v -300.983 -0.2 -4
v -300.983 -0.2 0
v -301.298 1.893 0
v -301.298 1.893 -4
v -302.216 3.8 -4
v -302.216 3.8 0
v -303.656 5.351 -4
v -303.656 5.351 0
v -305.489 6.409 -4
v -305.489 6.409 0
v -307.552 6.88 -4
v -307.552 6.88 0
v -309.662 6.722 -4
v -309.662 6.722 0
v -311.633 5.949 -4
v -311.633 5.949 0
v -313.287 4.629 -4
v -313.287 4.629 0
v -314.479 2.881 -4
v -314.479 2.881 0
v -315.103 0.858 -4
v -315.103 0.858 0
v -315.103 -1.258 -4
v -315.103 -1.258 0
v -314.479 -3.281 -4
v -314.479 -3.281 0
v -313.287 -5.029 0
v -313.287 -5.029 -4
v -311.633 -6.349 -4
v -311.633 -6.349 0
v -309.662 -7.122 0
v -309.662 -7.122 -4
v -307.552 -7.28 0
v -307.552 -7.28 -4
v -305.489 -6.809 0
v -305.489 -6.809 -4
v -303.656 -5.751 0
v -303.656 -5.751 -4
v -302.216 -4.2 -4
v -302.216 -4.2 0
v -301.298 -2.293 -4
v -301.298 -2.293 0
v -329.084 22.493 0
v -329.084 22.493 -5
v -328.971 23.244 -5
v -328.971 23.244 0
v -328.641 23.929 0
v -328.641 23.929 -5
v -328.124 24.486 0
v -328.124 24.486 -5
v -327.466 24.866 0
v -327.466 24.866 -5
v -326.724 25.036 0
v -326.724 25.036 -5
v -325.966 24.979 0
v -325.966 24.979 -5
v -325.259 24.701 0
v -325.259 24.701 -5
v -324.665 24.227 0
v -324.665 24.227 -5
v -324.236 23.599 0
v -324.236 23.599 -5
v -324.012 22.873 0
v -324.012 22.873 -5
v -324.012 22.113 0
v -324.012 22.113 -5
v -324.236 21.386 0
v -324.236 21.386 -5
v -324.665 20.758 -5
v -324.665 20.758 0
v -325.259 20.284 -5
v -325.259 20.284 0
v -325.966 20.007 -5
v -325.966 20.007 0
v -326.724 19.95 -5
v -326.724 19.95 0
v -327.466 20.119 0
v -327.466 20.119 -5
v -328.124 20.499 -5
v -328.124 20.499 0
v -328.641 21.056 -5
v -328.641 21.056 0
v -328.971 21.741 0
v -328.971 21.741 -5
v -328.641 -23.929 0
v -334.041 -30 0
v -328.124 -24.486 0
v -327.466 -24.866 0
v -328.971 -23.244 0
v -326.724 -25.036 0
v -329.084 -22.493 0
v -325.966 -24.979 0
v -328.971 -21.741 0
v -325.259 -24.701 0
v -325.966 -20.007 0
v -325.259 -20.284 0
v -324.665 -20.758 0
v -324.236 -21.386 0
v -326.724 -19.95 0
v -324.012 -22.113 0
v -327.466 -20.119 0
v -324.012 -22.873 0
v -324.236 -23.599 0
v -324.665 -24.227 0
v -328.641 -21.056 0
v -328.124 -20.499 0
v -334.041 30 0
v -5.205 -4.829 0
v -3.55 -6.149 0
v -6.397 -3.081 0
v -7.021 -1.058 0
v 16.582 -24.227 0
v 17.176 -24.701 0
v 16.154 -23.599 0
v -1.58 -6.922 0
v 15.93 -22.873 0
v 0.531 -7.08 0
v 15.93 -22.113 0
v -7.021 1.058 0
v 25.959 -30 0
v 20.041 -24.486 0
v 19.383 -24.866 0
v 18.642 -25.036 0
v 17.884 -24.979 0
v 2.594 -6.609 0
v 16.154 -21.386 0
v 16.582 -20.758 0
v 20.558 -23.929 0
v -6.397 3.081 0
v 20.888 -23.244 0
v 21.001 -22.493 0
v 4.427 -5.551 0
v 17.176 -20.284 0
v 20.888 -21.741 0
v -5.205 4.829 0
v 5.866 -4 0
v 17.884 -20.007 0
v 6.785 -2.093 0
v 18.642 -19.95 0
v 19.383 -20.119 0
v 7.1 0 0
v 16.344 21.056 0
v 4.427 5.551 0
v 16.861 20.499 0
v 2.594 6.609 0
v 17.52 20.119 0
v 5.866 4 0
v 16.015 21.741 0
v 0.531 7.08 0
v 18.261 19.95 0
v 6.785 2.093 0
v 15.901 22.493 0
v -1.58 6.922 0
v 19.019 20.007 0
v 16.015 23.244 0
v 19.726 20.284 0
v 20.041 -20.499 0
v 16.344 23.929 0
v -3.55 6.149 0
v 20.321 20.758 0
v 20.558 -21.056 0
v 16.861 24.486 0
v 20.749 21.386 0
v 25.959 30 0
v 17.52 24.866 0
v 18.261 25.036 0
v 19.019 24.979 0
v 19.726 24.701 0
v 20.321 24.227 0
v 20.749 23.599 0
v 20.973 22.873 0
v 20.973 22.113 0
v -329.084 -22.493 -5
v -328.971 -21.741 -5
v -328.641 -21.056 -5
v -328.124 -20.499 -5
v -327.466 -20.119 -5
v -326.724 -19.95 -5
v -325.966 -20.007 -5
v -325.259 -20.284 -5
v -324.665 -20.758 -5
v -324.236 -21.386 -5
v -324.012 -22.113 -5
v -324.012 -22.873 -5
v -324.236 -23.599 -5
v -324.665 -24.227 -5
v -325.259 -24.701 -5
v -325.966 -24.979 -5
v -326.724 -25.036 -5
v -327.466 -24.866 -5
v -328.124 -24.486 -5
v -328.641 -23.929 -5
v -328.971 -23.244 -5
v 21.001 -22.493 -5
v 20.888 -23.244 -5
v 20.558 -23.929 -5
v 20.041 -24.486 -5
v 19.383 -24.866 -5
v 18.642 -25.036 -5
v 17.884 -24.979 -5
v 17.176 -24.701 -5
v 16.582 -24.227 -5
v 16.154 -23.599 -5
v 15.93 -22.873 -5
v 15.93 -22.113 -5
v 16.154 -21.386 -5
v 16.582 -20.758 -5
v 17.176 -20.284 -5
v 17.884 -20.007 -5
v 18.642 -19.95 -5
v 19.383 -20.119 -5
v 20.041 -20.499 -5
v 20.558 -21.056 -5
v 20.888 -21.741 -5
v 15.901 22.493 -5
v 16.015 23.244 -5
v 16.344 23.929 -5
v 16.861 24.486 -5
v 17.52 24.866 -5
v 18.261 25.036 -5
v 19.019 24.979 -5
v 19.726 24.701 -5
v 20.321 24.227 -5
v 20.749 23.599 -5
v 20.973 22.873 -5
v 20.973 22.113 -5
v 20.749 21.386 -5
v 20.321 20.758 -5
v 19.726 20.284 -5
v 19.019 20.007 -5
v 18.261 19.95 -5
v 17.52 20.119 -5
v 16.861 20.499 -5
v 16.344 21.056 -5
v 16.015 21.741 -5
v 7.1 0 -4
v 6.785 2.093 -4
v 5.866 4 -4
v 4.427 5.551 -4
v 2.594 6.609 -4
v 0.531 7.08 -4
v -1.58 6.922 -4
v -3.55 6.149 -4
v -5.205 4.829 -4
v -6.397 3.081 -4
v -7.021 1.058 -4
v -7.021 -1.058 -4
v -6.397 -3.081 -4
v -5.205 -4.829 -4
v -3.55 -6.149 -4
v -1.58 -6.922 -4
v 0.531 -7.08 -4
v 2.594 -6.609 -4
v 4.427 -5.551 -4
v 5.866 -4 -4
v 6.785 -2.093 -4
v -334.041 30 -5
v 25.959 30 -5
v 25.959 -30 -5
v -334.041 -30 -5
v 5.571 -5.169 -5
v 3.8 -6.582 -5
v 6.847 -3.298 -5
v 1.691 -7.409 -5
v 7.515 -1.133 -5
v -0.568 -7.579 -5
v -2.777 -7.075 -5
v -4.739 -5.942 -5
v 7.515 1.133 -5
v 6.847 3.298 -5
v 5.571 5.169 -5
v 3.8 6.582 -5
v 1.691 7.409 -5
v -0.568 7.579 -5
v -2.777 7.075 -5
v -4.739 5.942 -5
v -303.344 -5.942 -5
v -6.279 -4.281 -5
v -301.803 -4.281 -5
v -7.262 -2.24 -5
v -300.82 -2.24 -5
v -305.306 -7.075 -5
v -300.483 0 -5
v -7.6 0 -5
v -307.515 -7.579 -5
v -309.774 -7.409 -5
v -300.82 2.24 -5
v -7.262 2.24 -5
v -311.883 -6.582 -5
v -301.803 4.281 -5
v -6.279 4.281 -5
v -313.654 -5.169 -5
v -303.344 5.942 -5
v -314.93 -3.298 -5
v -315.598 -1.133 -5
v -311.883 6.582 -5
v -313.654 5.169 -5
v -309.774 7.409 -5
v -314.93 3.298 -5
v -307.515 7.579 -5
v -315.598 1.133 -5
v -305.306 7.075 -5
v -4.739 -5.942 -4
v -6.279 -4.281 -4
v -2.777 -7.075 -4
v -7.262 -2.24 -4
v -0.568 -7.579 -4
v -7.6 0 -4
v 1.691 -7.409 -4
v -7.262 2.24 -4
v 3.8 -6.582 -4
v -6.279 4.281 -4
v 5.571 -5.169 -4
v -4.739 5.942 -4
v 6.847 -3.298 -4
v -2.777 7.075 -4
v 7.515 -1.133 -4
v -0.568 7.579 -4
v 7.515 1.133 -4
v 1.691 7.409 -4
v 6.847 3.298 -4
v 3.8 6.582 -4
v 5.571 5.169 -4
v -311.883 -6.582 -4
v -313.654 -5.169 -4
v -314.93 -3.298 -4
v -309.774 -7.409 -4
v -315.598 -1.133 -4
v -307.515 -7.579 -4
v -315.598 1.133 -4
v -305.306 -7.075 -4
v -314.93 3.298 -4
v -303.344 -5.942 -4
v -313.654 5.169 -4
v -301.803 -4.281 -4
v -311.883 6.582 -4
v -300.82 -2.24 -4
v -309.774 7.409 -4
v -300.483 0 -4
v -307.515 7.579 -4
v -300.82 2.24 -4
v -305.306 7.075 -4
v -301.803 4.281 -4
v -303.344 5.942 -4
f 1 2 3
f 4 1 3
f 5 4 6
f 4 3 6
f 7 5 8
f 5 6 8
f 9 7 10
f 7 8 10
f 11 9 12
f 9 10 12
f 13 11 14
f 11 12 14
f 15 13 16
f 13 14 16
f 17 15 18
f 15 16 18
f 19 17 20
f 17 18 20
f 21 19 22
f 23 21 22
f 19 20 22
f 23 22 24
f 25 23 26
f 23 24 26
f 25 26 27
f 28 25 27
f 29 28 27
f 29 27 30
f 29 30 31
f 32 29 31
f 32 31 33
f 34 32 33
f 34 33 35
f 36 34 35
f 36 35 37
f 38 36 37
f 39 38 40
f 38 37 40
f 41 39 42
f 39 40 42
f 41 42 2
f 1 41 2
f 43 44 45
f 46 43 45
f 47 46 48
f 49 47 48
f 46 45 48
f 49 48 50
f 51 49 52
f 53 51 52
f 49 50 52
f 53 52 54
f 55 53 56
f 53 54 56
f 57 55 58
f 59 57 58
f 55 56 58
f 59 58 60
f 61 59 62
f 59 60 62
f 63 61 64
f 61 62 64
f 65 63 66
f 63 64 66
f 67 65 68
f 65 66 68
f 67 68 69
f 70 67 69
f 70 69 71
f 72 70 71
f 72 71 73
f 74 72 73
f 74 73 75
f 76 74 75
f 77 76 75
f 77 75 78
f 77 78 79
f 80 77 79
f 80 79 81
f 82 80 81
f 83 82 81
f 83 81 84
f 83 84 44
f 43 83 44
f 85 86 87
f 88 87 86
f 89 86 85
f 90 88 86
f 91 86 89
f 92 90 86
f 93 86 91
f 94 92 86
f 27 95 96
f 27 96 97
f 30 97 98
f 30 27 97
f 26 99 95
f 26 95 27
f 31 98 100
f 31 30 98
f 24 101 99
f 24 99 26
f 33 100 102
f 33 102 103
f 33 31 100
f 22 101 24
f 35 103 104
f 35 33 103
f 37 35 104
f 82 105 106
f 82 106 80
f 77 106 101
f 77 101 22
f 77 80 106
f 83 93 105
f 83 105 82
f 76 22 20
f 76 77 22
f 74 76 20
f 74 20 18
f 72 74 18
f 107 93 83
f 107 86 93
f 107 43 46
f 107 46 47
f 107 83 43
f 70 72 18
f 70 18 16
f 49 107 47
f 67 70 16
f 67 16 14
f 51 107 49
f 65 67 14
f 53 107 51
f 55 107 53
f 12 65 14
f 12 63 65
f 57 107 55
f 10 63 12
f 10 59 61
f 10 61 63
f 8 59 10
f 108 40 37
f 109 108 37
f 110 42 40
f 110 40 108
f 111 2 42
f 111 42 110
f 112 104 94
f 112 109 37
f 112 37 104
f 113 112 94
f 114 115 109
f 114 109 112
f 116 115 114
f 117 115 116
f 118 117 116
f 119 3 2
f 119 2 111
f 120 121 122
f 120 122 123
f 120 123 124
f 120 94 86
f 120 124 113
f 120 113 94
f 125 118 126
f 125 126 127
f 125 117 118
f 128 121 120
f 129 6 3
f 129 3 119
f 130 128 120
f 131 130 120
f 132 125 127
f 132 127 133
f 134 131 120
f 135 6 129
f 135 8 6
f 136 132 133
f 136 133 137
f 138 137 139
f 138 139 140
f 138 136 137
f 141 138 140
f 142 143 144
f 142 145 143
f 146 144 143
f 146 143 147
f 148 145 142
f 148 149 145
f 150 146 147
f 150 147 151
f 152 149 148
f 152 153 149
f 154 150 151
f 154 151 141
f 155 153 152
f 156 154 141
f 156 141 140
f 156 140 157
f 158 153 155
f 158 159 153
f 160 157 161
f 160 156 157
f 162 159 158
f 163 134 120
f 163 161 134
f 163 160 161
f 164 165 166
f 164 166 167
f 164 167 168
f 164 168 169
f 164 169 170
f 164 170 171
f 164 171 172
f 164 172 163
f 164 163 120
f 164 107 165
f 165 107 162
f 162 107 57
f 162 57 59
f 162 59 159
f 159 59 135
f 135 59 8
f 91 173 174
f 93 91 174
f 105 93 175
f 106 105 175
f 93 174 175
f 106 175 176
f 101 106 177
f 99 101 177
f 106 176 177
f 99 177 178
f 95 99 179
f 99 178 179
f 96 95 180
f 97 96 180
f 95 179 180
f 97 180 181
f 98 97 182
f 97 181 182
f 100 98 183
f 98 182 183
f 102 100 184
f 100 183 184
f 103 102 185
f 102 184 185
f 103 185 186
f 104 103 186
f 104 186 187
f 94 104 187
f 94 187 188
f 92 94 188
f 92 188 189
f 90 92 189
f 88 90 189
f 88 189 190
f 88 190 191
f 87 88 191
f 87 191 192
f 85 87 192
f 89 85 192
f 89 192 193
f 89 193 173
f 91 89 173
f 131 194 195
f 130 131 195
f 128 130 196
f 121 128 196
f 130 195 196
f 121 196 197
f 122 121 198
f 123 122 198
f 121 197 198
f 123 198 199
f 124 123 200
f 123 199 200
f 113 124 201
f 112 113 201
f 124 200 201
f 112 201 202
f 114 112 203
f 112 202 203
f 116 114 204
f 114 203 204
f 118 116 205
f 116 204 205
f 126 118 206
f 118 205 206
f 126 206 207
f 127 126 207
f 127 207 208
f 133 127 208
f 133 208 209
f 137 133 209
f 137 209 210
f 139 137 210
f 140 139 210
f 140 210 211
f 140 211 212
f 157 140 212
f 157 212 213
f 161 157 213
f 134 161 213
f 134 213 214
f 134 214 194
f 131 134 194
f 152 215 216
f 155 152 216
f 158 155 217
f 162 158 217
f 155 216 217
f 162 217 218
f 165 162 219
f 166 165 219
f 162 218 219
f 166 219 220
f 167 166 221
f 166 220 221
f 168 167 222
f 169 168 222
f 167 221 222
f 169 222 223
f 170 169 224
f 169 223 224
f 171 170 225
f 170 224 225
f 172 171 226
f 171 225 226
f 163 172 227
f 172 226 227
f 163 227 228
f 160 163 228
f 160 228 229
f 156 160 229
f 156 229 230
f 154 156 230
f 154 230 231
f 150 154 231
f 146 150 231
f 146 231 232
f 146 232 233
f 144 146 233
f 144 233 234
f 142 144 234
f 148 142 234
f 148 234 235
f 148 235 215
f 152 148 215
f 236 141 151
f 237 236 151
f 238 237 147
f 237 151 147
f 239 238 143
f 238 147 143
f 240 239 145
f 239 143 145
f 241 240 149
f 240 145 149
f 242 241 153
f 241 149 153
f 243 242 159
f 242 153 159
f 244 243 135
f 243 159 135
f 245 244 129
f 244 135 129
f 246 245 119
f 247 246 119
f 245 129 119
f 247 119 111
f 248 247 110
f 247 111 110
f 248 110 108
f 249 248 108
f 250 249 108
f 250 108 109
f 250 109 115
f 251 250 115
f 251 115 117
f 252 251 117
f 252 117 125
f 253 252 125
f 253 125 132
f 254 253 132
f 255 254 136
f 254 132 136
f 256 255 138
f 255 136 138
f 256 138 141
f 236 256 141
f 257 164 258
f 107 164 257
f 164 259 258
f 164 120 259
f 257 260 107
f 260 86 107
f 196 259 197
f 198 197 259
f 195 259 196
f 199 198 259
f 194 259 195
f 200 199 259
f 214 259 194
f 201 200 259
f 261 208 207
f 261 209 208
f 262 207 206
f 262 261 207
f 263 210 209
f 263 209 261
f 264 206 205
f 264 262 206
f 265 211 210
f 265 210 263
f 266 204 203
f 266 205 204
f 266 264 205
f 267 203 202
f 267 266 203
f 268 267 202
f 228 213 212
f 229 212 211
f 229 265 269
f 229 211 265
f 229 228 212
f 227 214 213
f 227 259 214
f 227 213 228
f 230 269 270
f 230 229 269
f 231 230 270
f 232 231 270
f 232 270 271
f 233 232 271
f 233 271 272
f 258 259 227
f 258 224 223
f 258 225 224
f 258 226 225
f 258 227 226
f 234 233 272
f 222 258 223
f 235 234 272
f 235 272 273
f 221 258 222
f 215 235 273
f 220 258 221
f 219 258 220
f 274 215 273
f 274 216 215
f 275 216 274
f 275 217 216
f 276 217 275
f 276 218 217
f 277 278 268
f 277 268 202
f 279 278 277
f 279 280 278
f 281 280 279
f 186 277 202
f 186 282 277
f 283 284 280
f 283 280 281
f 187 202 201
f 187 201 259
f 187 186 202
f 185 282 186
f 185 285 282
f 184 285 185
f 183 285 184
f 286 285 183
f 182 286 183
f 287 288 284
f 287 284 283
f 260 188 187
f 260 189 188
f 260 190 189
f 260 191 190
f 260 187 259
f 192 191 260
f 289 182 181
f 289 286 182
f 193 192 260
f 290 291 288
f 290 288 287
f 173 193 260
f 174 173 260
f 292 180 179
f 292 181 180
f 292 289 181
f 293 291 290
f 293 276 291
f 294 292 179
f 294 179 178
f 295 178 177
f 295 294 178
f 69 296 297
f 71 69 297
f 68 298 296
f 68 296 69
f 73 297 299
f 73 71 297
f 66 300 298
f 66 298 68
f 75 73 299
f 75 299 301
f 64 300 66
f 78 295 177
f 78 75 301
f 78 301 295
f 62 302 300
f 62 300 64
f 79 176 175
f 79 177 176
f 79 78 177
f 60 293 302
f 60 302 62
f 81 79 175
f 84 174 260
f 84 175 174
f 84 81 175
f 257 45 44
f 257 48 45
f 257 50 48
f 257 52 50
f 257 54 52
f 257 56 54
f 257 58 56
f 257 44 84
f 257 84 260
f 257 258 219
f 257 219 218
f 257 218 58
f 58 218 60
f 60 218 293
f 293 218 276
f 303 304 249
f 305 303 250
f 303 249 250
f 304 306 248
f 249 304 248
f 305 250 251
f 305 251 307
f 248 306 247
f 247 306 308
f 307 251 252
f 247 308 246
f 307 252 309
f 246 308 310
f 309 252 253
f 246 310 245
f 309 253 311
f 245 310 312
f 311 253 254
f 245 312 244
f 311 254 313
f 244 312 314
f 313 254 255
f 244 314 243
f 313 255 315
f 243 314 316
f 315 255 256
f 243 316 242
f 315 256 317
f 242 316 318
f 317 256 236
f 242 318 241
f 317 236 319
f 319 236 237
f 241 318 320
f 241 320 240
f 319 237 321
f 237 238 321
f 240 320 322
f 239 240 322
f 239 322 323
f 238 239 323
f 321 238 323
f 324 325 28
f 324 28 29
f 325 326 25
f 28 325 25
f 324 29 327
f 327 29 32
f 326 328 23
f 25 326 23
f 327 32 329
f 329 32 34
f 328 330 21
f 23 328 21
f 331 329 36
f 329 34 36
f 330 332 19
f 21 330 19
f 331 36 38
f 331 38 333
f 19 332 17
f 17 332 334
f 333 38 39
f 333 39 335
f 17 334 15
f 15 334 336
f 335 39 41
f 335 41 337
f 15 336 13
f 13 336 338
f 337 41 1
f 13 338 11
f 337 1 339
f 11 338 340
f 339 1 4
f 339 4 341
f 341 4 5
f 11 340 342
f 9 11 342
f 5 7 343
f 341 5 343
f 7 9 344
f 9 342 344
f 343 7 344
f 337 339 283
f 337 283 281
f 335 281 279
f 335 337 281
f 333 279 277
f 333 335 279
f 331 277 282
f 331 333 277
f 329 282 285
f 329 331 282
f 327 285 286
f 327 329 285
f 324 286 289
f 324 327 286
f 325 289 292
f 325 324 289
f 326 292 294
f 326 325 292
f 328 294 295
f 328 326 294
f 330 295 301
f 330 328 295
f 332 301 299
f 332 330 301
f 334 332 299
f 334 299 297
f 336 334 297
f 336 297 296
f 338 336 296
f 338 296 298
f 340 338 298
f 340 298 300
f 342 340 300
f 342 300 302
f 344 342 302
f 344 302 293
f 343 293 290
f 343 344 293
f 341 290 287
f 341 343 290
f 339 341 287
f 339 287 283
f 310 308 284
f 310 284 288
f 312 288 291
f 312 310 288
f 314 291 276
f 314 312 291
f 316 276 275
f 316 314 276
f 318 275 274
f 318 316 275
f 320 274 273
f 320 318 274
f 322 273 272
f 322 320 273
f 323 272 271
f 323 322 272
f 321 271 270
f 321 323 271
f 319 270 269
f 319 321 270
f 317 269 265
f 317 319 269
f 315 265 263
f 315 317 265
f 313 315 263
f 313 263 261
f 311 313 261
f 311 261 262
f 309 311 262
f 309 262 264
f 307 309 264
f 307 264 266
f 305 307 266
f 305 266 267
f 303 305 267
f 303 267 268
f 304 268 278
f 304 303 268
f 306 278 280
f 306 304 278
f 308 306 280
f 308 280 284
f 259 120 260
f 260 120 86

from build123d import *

# Parameters (mm, degrees)
SKETCH1_W           = 360
SKETCH1_H           = 60
SKETCH1_R           = 7.1
BOSS_EXTRUDE1_DEPTH = 4
SKETCH2_W           = 360
SKETCH2_H           = 60
SKETCH2_R           = 7.6
BOSS_EXTRUDE2_DEPTH = 1
CUT_EXTRUDE1_REACH  = 337.423
SKETCH3_R           = 2.55


with BuildPart() as part:
    # Sketch1 → Boss-Extrude1 (new body)
    with BuildSketch(Plane.XY):
        with Locations((-154.041275094, 0)):
            Rectangle(SKETCH1_W, SKETCH1_H)
        Circle(SKETCH1_R, mode=Mode.SUBTRACT)
        with Locations((-308.082550187, -0.2)):
            Circle(SKETCH1_R, mode=Mode.SUBTRACT)
    extrude(amount=-BOSS_EXTRUDE1_DEPTH)

    # Sketch2 → Boss-Extrude2 (add)
    with BuildSketch(Plane(origin=(0, 0, -4), x_dir=(-1, 0, 0), z_dir=(0, 0, -1))):
        with Locations((154.041275094, 0)):
            Rectangle(SKETCH2_W, SKETCH2_H)
        Circle(SKETCH2_R, mode=Mode.SUBTRACT)
        with Locations(Location((308.082550187, 0, 0), (0, 0, 180))):
            Circle(SKETCH2_R, mode=Mode.SUBTRACT)
    extrude(amount=BOSS_EXTRUDE2_DEPTH)

    # Sketch3 → Cut-Extrude1 (cut, up to next)
    with BuildSketch(Plane(origin=(0, 0, -5), x_dir=(-1, 0, 0), z_dir=(0, 0, -1)), mode=Mode.PRIVATE) as cut_extrude1_sk1:
        with Locations((326.53392807, -22.492652976)):
            Circle(SKETCH3_R)
    cut_extrude1_tool1 = extrude(cut_extrude1_sk1.sketch, amount=-CUT_EXTRUDE1_REACH, mode=Mode.PRIVATE) & part.part
    # Sketch3 → Cut-Extrude1 (cut, up to next)
    with BuildSketch(Plane(origin=(0, 0, -5), x_dir=(-1, 0, 0), z_dir=(0, 0, -1)), mode=Mode.PRIVATE) as cut_extrude1_sk2:
        with Locations((326.53392807, 22.492652976)):
            Circle(SKETCH3_R)
    cut_extrude1_tool2 = extrude(cut_extrude1_sk2.sketch, amount=-CUT_EXTRUDE1_REACH, mode=Mode.PRIVATE) & part.part
    # Sketch3 → Cut-Extrude1 (cut, up to next)
    with BuildSketch(Plane(origin=(0, 0, -5), x_dir=(-1, 0, 0), z_dir=(0, 0, -1)), mode=Mode.PRIVATE) as cut_extrude1_sk3:
        with Locations(Location((-18.451377883, -22.492652976, 0), (0, 0, 180))):
            Circle(SKETCH3_R)
    cut_extrude1_tool3 = extrude(cut_extrude1_sk3.sketch, amount=-CUT_EXTRUDE1_REACH, mode=Mode.PRIVATE) & part.part
    # Sketch3 → Cut-Extrude1 (cut, up to next)
    with BuildSketch(Plane(origin=(0, 0, -5), x_dir=(-1, 0, 0), z_dir=(0, 0, -1)), mode=Mode.PRIVATE) as cut_extrude1_sk4:
        with Locations((-18.451377883, 22.492652976)):
            Circle(SKETCH3_R)
    cut_extrude1_tool4 = extrude(cut_extrude1_sk4.sketch, amount=-CUT_EXTRUDE1_REACH, mode=Mode.PRIVATE) & part.part
    add(cut_extrude1_tool1.solids().sort_by_distance((-326.533928, -22.492653, -5))[0], mode=Mode.SUBTRACT)
    add(cut_extrude1_tool2.solids().sort_by_distance((-326.533928, 22.492653, -5))[0], mode=Mode.SUBTRACT)
    add(cut_extrude1_tool3.solids().sort_by_distance((18.451378, -22.492653, -5))[0], mode=Mode.SUBTRACT)
    add(cut_extrude1_tool4.solids().sort_by_distance((18.451378, 22.492653, -5))[0], mode=Mode.SUBTRACT)


solid = part.part
